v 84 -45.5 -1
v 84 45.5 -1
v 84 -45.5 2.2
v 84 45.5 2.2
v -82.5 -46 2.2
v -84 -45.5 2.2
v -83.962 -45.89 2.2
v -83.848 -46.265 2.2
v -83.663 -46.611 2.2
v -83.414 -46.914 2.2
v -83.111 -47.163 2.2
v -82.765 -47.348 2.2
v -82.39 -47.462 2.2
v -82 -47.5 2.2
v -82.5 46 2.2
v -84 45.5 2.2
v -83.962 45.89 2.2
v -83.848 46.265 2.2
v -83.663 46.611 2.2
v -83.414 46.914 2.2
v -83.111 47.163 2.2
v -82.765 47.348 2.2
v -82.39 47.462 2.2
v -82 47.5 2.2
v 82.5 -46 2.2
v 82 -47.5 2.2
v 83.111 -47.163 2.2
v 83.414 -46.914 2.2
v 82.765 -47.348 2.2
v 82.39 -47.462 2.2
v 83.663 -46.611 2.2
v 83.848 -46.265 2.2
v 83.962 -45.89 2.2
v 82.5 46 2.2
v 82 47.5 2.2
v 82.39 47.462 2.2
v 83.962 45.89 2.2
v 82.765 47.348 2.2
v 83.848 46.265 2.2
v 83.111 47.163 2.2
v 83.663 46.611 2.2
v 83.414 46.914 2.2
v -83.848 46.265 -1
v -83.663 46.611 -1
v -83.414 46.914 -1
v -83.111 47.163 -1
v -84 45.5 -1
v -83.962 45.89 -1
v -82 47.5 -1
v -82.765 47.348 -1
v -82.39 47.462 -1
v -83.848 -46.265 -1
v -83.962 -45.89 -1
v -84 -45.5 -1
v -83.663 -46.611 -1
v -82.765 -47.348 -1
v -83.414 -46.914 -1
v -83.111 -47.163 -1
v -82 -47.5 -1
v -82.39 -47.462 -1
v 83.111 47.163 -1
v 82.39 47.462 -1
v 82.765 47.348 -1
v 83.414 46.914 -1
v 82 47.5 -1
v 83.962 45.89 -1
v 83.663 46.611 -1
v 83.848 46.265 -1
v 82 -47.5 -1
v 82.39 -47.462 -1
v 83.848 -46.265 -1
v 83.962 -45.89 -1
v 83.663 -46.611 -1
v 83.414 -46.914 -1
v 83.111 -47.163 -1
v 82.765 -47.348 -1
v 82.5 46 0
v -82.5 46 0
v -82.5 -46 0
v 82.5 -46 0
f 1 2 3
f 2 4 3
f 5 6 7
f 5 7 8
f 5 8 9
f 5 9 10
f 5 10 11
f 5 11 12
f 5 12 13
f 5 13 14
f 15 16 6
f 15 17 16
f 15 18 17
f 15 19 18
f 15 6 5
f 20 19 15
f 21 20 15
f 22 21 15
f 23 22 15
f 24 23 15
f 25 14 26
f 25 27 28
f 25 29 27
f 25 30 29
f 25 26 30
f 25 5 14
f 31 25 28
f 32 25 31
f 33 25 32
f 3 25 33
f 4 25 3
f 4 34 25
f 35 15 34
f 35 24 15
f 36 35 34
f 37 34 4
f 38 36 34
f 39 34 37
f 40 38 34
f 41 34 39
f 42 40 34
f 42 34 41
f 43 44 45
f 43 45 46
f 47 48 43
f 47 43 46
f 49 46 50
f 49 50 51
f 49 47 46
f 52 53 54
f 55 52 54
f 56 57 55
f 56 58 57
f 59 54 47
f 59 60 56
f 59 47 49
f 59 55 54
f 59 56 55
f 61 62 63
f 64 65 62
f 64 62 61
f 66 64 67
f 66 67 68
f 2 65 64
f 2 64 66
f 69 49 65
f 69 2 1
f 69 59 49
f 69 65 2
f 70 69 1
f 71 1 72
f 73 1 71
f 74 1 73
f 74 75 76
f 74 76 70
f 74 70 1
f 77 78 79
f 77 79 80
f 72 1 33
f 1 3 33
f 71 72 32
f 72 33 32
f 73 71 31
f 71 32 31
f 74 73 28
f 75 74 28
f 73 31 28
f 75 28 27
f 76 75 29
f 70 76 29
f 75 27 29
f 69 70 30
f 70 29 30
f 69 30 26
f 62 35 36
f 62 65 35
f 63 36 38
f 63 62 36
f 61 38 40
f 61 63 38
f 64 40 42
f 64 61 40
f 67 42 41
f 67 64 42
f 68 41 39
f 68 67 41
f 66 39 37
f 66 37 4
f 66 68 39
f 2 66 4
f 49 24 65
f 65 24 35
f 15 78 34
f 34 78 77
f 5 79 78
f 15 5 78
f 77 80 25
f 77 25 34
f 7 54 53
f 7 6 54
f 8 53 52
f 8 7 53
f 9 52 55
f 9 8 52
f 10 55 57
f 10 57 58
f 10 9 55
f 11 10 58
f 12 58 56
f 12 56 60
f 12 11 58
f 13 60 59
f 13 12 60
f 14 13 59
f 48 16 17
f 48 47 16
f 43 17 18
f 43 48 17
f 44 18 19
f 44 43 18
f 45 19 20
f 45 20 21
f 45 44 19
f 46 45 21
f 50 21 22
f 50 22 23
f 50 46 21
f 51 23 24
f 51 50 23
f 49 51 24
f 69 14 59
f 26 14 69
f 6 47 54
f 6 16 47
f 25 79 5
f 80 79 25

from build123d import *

# Parameters (mm, degrees)
F0_W        = 168
F0_H        = 95
F0_W_2      = 165
F0_H_2      = 92
F1_DEPTH    = 2.2
F1_FACE_W   = 168
F1_FACE_H   = 95
F1_FACE_W_2 = 165
F1_FACE_H_2 = 92
F2_DEPTH    = 1
F3_R        = 2


with BuildPart() as f1:
    # F0 (on Top) → F1 (new body)
    with BuildSketch(Plane.XY):
        Rectangle(F0_W, F0_H)
        Rectangle(F0_W_2, F0_H_2, mode=Mode.SUBTRACT)
    extrude(amount=F1_DEPTH)

    # F1_face (on face) + F0 (on Top) → F2 (join)
    with BuildSketch(Plane(origin=(0, 0, 0), x_dir=(1, 0, 0), z_dir=(0, 0, -1))):
        Rectangle(F1_FACE_W, F1_FACE_H)
        Rectangle(F1_FACE_W_2, F1_FACE_H_2, mode=Mode.SUBTRACT)
    with BuildSketch(Plane.XY):
        Rectangle(F0_W_2, F0_H_2)
    extrude(amount=F2_DEPTH, dir=(0, 0, -1))

    # F3
    f3_edges = [f1.edges().sort_by_distance(p)[0] for p in [
        (-84, -47.5, 0.6),
        (-84, 47.5, 0.6),
        (84, -47.5, 0.6),
        (84, 47.5, 0.6),
    ]]
    fillet(f3_edges, radius=F3_R)


solid = f1.part
